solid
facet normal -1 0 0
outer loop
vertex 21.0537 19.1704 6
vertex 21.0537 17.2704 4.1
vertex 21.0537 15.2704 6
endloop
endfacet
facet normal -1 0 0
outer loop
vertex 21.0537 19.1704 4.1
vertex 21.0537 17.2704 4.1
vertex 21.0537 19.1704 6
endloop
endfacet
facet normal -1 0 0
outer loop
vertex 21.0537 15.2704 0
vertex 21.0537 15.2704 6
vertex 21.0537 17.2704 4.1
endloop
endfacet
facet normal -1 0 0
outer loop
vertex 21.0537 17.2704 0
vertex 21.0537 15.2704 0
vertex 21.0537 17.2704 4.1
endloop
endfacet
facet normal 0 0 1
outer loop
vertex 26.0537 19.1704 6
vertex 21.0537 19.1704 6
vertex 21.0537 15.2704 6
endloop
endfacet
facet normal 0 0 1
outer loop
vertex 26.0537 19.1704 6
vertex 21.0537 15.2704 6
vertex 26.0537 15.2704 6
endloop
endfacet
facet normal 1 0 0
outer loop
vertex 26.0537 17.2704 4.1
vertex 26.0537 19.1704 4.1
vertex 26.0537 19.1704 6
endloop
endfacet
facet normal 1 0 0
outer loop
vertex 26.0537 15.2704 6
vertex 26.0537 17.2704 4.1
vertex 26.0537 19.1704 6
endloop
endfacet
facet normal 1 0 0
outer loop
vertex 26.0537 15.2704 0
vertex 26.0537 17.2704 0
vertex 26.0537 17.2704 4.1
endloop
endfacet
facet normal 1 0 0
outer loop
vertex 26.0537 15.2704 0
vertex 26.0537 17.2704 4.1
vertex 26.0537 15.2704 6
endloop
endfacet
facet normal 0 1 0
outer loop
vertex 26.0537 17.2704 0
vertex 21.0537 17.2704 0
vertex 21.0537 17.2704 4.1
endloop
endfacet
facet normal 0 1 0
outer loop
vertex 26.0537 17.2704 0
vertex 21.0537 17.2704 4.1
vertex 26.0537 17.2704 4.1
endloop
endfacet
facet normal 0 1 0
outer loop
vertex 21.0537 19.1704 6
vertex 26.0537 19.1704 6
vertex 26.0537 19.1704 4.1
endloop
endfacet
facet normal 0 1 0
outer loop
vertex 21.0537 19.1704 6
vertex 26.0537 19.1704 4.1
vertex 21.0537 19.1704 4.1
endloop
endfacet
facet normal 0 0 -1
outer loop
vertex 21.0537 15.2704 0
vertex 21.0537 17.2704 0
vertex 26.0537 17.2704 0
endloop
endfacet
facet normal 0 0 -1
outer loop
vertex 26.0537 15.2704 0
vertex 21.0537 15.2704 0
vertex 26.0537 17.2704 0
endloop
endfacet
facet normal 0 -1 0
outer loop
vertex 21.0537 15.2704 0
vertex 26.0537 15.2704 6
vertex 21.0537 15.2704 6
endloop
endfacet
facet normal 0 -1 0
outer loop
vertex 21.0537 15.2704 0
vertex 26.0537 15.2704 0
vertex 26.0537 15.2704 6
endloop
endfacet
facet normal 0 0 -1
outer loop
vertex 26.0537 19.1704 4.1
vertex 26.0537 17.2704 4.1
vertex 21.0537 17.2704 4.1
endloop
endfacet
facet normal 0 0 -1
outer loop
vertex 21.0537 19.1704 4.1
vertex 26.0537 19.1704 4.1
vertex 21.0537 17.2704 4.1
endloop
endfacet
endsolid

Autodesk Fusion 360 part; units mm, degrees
sketch "Esquisse1" plane through (0, 0, 0) normal (0, 0, 1) x (1, 0, 0)
  line L0 (21.0537, 17.2704) -> (26.0537, 17.2704)
  line L1 (26.0537, 17.2704) -> (26.0537, 15.2704)
  line L2 (26.0537, 15.2704) -> (21.0537, 15.2704)
  line L3 (21.0537, 15.2704) -> (21.0537, 17.2704)
  dimension "d1" = 5
  dimension "d2" = 2
extrude "Extrusion1" add sketch "Esquisse1" along normal blind 6
sketch "Esquisse2" plane through (0, 17.2704, 0) normal (0, 1, 0) x (-1, 0, 0)
  line L0 (-26.0537, 0) -> (-21.0537, 0)
  line L1 (-21.0537, 0) -> (-21.0537, 6)
  line L2 (-21.0537, 6) -> (-26.0537, 6)
  line L3 (-26.0537, 6) -> (-26.0537, 0)
  line L4 (-21.0537, 6) -> (-26.0537, 6)
  line L5 (-26.0537, 6) -> (-26.0537, 4.1)
  line L6 (-26.0537, 4.1) -> (-21.0537, 4.1)
  line L7 (-21.0537, 4.1) -> (-21.0537, 6)
  dimension "d5" = 1.9
extrude "Extrusion2" add sketch "Esquisse2" along normal blind 1.9 contours L1 L2 L3 L4 L5 L6 L7
